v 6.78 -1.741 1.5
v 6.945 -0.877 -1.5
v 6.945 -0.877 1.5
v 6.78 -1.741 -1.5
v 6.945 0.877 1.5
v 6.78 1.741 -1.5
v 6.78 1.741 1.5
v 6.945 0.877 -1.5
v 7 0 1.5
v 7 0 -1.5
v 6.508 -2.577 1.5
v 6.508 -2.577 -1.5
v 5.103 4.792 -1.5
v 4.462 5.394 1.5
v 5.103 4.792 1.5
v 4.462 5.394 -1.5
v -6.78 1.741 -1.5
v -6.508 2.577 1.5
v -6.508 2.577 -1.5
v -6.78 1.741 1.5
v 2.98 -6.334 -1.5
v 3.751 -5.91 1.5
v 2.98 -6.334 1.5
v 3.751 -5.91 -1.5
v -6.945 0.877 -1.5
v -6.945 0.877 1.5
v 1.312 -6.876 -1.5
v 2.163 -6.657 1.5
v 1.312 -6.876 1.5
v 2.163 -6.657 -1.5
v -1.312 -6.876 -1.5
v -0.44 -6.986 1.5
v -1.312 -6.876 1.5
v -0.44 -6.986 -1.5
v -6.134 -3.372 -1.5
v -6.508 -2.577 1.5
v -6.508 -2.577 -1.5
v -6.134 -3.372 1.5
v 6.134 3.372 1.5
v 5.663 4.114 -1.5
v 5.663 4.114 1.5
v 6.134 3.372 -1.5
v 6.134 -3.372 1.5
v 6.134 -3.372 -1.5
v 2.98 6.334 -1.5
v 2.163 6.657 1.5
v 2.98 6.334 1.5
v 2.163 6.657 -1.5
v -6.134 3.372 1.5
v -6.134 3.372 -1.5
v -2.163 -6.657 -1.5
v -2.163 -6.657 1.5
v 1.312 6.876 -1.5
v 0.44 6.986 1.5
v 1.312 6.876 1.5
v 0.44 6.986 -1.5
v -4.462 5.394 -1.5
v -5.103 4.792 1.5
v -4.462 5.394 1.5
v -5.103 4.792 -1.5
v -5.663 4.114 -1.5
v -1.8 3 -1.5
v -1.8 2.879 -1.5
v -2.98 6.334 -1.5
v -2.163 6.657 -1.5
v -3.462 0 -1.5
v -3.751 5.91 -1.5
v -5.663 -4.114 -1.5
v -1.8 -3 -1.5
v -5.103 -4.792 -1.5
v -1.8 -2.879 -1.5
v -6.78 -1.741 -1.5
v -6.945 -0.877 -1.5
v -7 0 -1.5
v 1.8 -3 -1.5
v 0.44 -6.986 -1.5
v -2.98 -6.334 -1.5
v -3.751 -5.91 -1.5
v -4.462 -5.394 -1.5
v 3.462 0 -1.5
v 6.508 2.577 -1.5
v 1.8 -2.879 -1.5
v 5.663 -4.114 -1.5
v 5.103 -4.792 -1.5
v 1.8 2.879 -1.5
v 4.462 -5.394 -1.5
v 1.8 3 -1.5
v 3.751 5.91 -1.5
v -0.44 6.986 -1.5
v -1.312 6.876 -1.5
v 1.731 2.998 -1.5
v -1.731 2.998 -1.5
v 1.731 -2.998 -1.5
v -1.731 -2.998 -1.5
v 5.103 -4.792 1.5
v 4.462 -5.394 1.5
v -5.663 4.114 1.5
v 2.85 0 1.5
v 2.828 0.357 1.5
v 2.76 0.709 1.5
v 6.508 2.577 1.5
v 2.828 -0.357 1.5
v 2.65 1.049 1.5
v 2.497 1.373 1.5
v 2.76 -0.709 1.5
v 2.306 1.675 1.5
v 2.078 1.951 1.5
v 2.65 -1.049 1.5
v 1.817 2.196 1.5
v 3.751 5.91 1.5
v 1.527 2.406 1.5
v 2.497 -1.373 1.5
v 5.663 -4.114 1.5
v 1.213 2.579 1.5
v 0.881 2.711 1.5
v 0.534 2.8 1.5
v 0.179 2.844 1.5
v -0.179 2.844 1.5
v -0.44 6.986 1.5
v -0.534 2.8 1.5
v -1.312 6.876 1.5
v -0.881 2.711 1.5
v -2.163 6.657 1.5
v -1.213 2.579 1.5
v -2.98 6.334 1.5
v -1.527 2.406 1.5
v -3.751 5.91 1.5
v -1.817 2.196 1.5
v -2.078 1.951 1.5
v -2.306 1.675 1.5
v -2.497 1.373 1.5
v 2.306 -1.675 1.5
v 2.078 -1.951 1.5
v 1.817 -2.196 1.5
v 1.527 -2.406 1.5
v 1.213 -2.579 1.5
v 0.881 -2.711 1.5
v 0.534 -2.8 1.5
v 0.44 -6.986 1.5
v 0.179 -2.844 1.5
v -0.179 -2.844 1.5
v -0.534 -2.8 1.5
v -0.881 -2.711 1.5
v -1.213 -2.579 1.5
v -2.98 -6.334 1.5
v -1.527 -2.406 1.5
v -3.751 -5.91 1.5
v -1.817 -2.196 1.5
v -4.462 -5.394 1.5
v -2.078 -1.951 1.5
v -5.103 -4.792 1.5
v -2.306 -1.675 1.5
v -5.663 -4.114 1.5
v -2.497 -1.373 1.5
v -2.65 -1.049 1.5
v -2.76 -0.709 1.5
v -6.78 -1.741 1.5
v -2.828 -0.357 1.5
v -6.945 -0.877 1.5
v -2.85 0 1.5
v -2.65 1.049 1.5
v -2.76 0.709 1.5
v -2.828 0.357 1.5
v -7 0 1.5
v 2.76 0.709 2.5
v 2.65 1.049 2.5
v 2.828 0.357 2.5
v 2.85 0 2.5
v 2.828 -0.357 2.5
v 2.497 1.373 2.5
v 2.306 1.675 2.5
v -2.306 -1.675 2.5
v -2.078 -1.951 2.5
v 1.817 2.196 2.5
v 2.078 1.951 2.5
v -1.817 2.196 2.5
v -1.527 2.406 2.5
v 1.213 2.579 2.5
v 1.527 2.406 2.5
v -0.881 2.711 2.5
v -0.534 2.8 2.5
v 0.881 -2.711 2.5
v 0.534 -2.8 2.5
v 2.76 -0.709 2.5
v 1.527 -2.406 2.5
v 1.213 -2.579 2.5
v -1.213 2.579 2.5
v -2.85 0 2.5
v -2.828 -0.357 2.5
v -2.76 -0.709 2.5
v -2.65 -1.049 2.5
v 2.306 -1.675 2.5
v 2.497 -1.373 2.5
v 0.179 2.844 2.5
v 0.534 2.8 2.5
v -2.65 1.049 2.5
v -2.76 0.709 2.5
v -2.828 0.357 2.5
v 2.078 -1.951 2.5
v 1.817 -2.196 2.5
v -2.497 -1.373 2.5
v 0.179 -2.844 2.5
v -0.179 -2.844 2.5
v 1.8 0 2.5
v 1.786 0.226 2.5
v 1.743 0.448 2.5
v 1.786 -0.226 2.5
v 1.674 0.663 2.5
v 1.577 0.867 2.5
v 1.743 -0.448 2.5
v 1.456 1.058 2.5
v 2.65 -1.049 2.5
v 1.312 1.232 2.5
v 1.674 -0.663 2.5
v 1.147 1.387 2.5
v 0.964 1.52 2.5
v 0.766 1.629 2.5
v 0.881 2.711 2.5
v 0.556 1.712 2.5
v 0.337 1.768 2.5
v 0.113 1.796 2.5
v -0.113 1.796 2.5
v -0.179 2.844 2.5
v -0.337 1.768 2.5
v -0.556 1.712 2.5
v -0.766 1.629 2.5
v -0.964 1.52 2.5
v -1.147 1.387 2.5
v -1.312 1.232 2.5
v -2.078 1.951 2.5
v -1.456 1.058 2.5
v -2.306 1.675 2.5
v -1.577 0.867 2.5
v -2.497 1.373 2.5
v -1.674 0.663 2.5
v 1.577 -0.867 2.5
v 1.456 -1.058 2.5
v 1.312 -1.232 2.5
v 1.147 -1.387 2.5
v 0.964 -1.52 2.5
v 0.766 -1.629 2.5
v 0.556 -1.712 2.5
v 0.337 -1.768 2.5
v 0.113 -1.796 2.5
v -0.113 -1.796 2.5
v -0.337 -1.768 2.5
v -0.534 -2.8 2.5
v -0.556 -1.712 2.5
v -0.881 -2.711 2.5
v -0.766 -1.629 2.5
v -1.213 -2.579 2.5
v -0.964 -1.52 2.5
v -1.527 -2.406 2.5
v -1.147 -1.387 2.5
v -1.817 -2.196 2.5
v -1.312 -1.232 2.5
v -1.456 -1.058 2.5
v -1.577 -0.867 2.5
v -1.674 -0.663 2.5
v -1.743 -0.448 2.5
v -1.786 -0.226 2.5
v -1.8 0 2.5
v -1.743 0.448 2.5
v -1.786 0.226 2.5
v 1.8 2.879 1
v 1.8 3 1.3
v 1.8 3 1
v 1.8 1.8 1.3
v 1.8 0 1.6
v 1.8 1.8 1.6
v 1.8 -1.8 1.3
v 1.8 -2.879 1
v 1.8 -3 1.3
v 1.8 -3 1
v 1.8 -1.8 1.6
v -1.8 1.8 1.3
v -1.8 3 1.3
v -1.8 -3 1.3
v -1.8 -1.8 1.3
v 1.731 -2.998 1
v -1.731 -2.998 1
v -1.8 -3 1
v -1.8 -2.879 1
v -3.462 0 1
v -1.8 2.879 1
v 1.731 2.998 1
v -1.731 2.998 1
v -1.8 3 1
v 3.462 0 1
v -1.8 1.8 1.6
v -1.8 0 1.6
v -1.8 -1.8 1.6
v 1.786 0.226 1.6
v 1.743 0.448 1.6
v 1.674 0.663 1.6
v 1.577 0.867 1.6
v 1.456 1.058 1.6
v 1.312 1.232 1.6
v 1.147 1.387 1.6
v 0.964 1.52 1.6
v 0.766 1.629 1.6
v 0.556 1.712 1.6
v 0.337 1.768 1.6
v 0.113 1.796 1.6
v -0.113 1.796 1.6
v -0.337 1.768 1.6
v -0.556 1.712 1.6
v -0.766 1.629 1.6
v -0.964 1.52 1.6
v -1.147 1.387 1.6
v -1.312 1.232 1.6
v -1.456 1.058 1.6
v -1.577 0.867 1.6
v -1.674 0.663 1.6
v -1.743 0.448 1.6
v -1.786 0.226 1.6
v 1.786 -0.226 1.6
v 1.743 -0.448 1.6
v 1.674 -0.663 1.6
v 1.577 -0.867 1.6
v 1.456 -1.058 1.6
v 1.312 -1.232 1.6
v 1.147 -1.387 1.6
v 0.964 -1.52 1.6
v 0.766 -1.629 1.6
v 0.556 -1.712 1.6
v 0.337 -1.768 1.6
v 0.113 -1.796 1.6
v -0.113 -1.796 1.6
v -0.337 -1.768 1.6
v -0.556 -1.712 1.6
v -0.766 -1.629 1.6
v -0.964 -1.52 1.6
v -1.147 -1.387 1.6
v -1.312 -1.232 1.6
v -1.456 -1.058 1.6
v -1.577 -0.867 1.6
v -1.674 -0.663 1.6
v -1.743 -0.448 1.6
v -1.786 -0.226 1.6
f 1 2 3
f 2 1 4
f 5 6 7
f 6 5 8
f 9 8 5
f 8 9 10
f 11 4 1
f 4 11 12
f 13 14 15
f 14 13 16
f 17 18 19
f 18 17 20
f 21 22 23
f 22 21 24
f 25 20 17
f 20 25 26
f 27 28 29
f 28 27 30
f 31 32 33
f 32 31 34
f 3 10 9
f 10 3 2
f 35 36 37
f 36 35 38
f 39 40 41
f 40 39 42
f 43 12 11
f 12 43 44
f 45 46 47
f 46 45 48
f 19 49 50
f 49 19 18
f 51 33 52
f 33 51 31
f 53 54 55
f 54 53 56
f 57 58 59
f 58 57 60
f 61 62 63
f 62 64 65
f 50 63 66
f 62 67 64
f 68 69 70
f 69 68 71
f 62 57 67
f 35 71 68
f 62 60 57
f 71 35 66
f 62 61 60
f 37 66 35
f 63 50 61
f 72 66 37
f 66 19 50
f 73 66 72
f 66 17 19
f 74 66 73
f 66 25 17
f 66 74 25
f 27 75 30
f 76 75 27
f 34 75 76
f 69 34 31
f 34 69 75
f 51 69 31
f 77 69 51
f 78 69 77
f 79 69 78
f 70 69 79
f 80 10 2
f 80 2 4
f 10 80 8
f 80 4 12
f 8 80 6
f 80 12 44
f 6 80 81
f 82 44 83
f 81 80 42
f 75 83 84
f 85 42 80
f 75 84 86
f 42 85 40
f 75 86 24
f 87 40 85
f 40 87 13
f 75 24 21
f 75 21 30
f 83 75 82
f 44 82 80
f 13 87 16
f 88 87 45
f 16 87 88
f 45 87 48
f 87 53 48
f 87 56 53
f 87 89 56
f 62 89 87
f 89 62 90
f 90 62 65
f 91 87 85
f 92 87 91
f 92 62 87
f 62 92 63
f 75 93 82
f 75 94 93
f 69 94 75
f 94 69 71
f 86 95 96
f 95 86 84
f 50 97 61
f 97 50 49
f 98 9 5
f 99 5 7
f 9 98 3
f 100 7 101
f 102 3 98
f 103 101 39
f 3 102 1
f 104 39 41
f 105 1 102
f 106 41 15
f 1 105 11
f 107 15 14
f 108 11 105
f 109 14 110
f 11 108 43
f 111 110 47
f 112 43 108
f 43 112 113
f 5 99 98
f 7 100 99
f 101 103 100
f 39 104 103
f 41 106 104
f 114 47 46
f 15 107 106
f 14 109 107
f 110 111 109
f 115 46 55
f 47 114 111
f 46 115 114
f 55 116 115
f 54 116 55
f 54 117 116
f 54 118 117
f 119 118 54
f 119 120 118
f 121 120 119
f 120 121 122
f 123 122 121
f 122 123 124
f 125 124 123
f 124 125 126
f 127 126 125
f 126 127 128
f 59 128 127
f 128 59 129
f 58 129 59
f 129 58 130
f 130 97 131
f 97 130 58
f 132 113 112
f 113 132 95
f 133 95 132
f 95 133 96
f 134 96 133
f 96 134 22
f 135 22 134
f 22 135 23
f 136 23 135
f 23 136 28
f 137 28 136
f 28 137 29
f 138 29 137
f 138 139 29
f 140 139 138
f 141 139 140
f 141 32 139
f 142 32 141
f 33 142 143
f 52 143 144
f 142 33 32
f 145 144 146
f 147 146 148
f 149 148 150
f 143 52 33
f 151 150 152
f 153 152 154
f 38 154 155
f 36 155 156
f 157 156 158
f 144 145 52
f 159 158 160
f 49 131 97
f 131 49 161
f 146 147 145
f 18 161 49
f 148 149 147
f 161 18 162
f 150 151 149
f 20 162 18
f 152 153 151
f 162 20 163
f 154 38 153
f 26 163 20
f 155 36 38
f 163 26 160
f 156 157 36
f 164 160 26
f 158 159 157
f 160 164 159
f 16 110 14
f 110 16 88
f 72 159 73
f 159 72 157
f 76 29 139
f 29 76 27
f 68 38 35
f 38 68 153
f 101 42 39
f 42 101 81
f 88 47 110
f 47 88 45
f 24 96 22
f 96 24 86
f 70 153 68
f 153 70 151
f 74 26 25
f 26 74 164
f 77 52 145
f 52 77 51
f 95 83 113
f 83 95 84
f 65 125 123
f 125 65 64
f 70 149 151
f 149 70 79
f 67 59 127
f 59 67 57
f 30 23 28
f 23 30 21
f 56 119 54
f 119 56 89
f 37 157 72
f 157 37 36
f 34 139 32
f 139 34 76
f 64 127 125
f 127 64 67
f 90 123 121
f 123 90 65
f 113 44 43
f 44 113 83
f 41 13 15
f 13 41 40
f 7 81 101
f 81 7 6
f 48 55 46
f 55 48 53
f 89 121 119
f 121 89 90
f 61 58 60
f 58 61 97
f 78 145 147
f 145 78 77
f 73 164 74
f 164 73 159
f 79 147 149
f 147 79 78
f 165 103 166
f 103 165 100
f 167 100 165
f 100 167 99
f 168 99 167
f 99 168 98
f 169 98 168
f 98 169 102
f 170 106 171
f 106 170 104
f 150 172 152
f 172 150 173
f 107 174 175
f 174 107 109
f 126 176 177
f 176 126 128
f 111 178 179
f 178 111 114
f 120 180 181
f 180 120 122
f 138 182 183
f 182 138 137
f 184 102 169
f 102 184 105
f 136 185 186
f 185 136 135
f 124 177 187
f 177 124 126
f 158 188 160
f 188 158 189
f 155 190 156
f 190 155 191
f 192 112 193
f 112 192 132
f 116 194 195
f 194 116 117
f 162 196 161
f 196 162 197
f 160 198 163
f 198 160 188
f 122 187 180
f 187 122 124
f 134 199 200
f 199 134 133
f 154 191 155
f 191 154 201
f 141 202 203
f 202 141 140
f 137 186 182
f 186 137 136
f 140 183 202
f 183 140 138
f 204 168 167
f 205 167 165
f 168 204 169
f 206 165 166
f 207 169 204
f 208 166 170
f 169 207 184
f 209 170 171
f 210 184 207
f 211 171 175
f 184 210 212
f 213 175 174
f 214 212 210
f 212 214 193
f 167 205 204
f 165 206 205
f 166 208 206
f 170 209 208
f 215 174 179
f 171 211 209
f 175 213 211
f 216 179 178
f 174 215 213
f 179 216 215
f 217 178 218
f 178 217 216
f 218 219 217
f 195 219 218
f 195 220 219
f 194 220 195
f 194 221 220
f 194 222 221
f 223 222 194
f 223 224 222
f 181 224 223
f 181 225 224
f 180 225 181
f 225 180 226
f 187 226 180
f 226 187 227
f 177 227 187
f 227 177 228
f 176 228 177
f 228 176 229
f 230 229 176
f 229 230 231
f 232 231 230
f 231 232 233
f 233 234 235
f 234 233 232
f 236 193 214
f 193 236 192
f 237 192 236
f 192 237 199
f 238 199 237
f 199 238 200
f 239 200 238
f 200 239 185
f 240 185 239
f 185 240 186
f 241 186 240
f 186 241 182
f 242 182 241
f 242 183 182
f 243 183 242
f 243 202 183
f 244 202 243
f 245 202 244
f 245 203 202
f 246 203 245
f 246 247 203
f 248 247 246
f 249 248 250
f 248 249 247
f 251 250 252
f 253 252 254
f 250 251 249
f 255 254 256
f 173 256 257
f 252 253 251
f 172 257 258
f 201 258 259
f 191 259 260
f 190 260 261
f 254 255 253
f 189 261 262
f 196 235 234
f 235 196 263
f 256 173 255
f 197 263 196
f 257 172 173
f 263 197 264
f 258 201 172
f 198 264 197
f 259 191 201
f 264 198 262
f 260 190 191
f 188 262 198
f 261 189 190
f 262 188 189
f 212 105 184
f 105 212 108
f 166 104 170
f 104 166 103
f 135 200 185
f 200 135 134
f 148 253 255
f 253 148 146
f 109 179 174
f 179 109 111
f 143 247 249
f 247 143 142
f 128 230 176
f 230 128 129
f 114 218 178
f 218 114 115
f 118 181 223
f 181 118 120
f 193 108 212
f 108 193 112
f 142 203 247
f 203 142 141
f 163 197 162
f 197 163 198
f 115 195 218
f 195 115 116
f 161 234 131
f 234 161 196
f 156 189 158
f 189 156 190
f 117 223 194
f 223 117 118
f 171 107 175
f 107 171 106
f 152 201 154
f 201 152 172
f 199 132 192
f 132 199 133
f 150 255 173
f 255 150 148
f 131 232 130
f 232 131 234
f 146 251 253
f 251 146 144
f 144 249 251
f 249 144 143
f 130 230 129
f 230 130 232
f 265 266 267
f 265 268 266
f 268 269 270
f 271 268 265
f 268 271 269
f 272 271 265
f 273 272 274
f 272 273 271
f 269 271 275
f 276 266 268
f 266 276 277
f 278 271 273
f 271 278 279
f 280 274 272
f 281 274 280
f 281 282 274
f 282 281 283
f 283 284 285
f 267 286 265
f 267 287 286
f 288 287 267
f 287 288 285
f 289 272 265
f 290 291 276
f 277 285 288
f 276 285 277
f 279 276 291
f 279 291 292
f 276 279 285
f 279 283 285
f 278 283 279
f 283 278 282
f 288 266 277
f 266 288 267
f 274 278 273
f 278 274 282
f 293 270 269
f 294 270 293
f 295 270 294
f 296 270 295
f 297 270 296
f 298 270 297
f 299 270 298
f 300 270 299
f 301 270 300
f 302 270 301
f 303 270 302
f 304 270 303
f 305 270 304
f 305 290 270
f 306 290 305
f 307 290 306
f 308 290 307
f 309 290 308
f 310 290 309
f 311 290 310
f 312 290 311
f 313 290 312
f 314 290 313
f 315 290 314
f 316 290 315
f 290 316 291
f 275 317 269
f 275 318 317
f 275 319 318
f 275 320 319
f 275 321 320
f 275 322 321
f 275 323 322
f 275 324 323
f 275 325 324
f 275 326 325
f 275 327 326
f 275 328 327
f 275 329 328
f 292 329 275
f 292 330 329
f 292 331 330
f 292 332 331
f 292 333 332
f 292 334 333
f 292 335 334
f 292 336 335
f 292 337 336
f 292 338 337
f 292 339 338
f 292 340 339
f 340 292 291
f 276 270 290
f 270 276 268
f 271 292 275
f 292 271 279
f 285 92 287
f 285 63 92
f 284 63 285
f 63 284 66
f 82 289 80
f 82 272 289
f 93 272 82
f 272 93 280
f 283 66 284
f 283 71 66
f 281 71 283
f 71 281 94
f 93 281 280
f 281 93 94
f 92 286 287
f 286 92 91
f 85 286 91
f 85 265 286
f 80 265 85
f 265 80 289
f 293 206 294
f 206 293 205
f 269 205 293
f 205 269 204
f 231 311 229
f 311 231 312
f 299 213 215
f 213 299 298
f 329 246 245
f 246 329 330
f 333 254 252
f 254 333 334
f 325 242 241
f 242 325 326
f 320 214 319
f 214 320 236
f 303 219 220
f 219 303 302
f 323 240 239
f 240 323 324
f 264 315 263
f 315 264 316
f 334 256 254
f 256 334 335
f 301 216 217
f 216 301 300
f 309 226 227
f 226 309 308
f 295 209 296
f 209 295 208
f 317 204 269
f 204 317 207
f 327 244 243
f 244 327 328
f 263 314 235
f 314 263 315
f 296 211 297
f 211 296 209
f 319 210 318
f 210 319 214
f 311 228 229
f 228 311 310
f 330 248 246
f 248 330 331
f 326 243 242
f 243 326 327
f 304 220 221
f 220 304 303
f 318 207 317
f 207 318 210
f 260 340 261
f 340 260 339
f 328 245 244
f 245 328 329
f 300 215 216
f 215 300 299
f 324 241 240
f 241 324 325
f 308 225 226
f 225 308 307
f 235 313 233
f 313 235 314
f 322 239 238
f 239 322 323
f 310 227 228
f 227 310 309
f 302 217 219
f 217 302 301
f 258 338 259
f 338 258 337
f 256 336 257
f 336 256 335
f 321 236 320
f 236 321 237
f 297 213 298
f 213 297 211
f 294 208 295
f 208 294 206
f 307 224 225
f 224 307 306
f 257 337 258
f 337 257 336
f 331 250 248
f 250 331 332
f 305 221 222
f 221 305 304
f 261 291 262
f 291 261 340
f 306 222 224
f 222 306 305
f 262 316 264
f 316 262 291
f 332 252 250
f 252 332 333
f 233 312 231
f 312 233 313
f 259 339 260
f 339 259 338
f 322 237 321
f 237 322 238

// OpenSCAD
$fn = 50;


difference() {
	union() {
		translate(v = [0, 0, -1.5000000000]) {
			cylinder(h = 3, r = 7.0000000000);
		}
		translate(v = [0, 0, -1.5000000000]) {
			cylinder(h = 4, r = 2.8500000000);
		}
	}
	union() {
		translate(v = [0, 0, -1.5000000000]) {
			rotate(a = [0, 0, 0]) {
				difference() {
					union() {
						translate(v = [-1.8000000000, -3.0000000000, -0.3000000000]) {
							cube(size = [3.6000000000, 6.0000000000, 0.3000000000]);
						}
						translate(v = [-1.8000000000, -1.8000000000, -0.6000000000]) {
							cube(size = [3.6000000000, 3.6000000000, 0.3000000000]);
						}
						translate(v = [-1.8000000000, -3.0000000000, 2.5000000000]) {
							cube(size = [3.6000000000, 6.0000000000, 0.3000000000]);
						}
						translate(v = [-1.8000000000, -1.8000000000, 2.8000000000]) {
							cube(size = [3.6000000000, 3.6000000000, 0.3000000000]);
						}
						linear_extrude(height = 2.5000000000) {
							polygon(points = [[3.4620000000, 0.0000000000], [1.7310000000, 2.9981799479], [-1.7310000000, 2.9981799479], [-3.4620000000, 0.0000000000], [-1.7310000000, -2.9981799479], [1.7310000000, -2.9981799479]]);
						}
						translate(v = [-1.8000000000, -3.0000000000, -0.3000000000]) {
							cube(size = [3.6000000000, 6.0000000000, 0.3000000000]);
						}
						translate(v = [-1.8000000000, -1.8000000000, -0.6000000000]) {
							cube(size = [3.6000000000, 3.6000000000, 0.3000000000]);
						}
						translate(v = [-1.8000000000, -3.0000000000, 2.5000000000]) {
							cube(size = [3.6000000000, 6.0000000000, 0.3000000000]);
						}
						translate(v = [-1.8000000000, -1.8000000000, 2.8000000000]) {
							cube(size = [3.6000000000, 3.6000000000, 0.3000000000]);
						}
						translate(v = [-1.8000000000, -3.0000000000, -0.3000000000]) {
							cube(size = [3.6000000000, 6.0000000000, 0.3000000000]);
						}
						translate(v = [-1.8000000000, -1.8000000000, -0.6000000000]) {
							cube(size = [3.6000000000, 3.6000000000, 0.3000000000]);
						}
						translate(v = [-1.8000000000, -3.0000000000, 2.5000000000]) {
							cube(size = [3.6000000000, 6.0000000000, 0.3000000000]);
						}
						translate(v = [-1.8000000000, -1.8000000000, 2.8000000000]) {
							cube(size = [3.6000000000, 3.6000000000, 0.3000000000]);
						}
					}
					union();
				}
			}
		}
		translate(v = [0, 0, -50.0000000000]) {
			cylinder(h = 100, r = 1.8000000000);
		}
	}
}
